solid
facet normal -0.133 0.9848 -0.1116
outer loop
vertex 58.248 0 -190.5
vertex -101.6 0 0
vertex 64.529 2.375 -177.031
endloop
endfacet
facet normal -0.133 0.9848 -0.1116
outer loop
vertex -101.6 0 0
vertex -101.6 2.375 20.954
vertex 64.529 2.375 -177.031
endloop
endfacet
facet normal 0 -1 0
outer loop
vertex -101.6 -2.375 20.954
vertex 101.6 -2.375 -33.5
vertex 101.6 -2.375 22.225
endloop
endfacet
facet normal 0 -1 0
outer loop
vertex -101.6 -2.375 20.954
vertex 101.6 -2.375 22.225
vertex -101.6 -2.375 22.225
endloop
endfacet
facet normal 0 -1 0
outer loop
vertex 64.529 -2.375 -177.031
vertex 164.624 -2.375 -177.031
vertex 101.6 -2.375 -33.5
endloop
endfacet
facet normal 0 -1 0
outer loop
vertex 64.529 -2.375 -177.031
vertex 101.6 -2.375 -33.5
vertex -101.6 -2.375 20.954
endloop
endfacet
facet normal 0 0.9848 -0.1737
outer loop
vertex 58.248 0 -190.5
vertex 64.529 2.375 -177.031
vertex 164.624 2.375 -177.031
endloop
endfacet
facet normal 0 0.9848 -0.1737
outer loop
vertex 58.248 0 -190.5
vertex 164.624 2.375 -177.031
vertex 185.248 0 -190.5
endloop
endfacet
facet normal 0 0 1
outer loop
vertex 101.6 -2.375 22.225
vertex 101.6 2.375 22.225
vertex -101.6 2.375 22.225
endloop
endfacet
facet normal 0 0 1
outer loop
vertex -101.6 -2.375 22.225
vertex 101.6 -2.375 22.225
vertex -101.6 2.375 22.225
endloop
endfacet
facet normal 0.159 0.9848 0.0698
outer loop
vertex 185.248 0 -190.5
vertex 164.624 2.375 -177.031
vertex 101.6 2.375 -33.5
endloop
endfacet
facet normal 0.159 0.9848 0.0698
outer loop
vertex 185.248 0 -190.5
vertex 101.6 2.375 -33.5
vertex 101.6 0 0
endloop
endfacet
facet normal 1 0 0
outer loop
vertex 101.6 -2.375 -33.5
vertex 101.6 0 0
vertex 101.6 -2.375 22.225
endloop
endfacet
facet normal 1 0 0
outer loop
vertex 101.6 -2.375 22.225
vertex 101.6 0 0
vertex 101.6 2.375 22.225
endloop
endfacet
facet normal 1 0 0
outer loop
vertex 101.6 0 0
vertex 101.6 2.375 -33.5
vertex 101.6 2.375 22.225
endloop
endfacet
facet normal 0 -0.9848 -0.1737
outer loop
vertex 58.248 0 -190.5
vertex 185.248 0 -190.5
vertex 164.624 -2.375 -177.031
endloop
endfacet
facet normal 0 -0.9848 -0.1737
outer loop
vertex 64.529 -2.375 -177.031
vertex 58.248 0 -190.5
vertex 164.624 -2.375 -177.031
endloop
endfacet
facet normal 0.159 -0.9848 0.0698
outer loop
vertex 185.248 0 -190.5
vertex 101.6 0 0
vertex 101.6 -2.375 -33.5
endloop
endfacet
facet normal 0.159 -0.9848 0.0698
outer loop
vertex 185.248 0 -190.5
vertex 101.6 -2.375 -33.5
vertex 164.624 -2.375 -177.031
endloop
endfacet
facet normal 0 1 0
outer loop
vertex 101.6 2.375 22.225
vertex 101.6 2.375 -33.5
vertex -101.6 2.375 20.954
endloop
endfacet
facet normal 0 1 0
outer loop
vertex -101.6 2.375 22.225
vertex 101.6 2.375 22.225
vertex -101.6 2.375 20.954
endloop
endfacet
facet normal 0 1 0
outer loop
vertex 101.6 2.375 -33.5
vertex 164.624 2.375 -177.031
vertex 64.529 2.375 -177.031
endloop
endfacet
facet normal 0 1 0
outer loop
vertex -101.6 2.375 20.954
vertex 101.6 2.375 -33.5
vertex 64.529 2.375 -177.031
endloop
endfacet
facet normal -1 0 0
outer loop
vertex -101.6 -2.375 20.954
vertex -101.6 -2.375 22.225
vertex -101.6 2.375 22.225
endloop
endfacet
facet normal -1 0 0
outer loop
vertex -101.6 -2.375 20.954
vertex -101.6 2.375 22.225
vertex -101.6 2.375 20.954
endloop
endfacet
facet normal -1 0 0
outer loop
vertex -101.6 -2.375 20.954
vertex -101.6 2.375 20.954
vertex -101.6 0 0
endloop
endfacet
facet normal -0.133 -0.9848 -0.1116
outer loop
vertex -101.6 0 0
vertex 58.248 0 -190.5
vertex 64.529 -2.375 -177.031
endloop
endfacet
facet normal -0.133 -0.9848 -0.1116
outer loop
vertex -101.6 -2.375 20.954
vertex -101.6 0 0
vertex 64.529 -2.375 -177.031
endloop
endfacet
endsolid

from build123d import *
from OCP.BRepFilletAPI import BRepFilletAPI_MakeChamfer

# Parameters (mm, degrees)
BOSS_EXTRUDE1_DEPTH = 2.3749
CHAMFER1_SIZE       = 2.3749
CHAMFER1_SIZE2      = 13.468727193
CHAMFER2_SIZE       = 2.3749
CHAMFER2_SIZE_2     = 13.468727193


with BuildPart() as part:
    # Sketch1 → Boss-Extrude1 (new, symmetric)
    with BuildSketch(Plane(origin=(0, 0, 0), x_dir=(1, 0, 0), z_dir=(0, 1, 0))):
        Polygon((-101.6, 0), (58.248479739, 190.5), (185.248479739, 190.5), (101.6, 0), (101.6, -22.225), (-101.6, -22.225), align=None)
    extrude(amount=BOSS_EXTRUDE1_DEPTH, both=True)

    # Chamfer1: one chamfer whose edges measure the first distance from different faces: ONE call of the kernel's chamfer builder (chamfer() names one face for all edges)
    chamfer1_edges_1 = [part.edges().sort_by_distance(p)[0] for p in [
        (121.748479739, 2.3749, -190.5),
    ]]
    chamfer1_side_1 = [part.faces().sort_by_distance(p)[0] for p in [
        (121.748479739, 0, -190.5),
    ]]
    chamfer1_edges_2 = [part.edges().sort_by_distance(p)[0] for p in [
        (-21.67576013, 2.3749, -95.25),
    ]]
    chamfer1_side_2 = [part.faces().sort_by_distance(p)[0] for p in [
        (-21.67576013, 0, -95.25),
    ]]
    chamfer1_edges_3 = [part.edges().sort_by_distance(p)[0] for p in [
        (143.42423987, 2.3749, -95.25),
    ]]
    chamfer1_side_3 = [part.faces().sort_by_distance(p)[0] for p in [
        (143.42423987, 0, -95.25),
    ]]
    chamfer1 = BRepFilletAPI_MakeChamfer(part.part.solid().wrapped)
    for e in chamfer1_edges_1:
        chamfer1.Add(CHAMFER1_SIZE, CHAMFER1_SIZE2, e.wrapped, chamfer1_side_1[0].wrapped)  # the first distance lies on this face
    for e in chamfer1_edges_2:
        chamfer1.Add(CHAMFER1_SIZE, CHAMFER1_SIZE2, e.wrapped, chamfer1_side_2[0].wrapped)  # the first distance lies on this face
    for e in chamfer1_edges_3:
        chamfer1.Add(CHAMFER1_SIZE, CHAMFER1_SIZE2, e.wrapped, chamfer1_side_3[0].wrapped)  # the first distance lies on this face
    add(Compound.cast(chamfer1.Shape()), mode=Mode.REPLACE)

    # Chamfer2
    # the kernel refuses this chamfer: 13.468727193, 2.3749 mm, written as the material it takes off along each edge
    with BuildSketch(Plane(origin=(199.319755492, -2.3749, -222.545747147), x_dir=(0.19240697277850308, 0.9776715712462557, 0.08448583078297824), z_dir=(-0.40204782056593685, 0, 0.9156186706146726))) as chamfer2_piece_1_section:
        Polygon((CHAMFER2_SIZE * 0.977671571246, CHAMFER2_SIZE * 0.210138760767), (-CHAMFER2_SIZE_2 * 0.210138760774, CHAMFER2_SIZE_2 * 0.977671571276), (0, 0), align=None)
    chamfer2_piece_1 = extrude(amount=278.054066026, mode=Mode.PRIVATE)
    chamfer2_piece_1 = split(chamfer2_piece_1, bisect_by=Plane(origin=(101.6, -1.721128259, -118.063928537), z_dir=(1, 0, 0)), keep=Keep.TOP, mode=Mode.PRIVATE)
    add(chamfer2_piece_1, mode=Mode.SUBTRACT)
    with BuildSketch(Plane(origin=(-124.096930076, -2.3749, 26.81079724), x_dir=(-0.1609756299698045, 0.9776715712462571, -0.13507459173619368), z_dir=(0.6427876096865406, 0, -0.7660444431189771))) as chamfer2_piece_2:
        Polygon((CHAMFER2_SIZE * 0.977671571246, CHAMFER2_SIZE * 0.210138760767), (-CHAMFER2_SIZE_2 * 0.210138760774, CHAMFER2_SIZE_2 * 0.977671571276), (0, 0), align=None)
    extrude(amount=318.678108919, mode=Mode.SUBTRACT)
    with BuildSketch(Plane(origin=(23.249469589, -2.3749, -190.5), x_dir=(0, 0.977671571246258, -0.21013876076743496), z_dir=(1, 0, 0))) as chamfer2_piece_3:
        Polygon((CHAMFER2_SIZE * 0.977671571246, CHAMFER2_SIZE * 0.210138760767), (-CHAMFER2_SIZE_2 * 0.210138760774, CHAMFER2_SIZE_2 * 0.977671571276), (0, 0), align=None)
    extrude(amount=196.998020301, mode=Mode.SUBTRACT)


solid = part.part
